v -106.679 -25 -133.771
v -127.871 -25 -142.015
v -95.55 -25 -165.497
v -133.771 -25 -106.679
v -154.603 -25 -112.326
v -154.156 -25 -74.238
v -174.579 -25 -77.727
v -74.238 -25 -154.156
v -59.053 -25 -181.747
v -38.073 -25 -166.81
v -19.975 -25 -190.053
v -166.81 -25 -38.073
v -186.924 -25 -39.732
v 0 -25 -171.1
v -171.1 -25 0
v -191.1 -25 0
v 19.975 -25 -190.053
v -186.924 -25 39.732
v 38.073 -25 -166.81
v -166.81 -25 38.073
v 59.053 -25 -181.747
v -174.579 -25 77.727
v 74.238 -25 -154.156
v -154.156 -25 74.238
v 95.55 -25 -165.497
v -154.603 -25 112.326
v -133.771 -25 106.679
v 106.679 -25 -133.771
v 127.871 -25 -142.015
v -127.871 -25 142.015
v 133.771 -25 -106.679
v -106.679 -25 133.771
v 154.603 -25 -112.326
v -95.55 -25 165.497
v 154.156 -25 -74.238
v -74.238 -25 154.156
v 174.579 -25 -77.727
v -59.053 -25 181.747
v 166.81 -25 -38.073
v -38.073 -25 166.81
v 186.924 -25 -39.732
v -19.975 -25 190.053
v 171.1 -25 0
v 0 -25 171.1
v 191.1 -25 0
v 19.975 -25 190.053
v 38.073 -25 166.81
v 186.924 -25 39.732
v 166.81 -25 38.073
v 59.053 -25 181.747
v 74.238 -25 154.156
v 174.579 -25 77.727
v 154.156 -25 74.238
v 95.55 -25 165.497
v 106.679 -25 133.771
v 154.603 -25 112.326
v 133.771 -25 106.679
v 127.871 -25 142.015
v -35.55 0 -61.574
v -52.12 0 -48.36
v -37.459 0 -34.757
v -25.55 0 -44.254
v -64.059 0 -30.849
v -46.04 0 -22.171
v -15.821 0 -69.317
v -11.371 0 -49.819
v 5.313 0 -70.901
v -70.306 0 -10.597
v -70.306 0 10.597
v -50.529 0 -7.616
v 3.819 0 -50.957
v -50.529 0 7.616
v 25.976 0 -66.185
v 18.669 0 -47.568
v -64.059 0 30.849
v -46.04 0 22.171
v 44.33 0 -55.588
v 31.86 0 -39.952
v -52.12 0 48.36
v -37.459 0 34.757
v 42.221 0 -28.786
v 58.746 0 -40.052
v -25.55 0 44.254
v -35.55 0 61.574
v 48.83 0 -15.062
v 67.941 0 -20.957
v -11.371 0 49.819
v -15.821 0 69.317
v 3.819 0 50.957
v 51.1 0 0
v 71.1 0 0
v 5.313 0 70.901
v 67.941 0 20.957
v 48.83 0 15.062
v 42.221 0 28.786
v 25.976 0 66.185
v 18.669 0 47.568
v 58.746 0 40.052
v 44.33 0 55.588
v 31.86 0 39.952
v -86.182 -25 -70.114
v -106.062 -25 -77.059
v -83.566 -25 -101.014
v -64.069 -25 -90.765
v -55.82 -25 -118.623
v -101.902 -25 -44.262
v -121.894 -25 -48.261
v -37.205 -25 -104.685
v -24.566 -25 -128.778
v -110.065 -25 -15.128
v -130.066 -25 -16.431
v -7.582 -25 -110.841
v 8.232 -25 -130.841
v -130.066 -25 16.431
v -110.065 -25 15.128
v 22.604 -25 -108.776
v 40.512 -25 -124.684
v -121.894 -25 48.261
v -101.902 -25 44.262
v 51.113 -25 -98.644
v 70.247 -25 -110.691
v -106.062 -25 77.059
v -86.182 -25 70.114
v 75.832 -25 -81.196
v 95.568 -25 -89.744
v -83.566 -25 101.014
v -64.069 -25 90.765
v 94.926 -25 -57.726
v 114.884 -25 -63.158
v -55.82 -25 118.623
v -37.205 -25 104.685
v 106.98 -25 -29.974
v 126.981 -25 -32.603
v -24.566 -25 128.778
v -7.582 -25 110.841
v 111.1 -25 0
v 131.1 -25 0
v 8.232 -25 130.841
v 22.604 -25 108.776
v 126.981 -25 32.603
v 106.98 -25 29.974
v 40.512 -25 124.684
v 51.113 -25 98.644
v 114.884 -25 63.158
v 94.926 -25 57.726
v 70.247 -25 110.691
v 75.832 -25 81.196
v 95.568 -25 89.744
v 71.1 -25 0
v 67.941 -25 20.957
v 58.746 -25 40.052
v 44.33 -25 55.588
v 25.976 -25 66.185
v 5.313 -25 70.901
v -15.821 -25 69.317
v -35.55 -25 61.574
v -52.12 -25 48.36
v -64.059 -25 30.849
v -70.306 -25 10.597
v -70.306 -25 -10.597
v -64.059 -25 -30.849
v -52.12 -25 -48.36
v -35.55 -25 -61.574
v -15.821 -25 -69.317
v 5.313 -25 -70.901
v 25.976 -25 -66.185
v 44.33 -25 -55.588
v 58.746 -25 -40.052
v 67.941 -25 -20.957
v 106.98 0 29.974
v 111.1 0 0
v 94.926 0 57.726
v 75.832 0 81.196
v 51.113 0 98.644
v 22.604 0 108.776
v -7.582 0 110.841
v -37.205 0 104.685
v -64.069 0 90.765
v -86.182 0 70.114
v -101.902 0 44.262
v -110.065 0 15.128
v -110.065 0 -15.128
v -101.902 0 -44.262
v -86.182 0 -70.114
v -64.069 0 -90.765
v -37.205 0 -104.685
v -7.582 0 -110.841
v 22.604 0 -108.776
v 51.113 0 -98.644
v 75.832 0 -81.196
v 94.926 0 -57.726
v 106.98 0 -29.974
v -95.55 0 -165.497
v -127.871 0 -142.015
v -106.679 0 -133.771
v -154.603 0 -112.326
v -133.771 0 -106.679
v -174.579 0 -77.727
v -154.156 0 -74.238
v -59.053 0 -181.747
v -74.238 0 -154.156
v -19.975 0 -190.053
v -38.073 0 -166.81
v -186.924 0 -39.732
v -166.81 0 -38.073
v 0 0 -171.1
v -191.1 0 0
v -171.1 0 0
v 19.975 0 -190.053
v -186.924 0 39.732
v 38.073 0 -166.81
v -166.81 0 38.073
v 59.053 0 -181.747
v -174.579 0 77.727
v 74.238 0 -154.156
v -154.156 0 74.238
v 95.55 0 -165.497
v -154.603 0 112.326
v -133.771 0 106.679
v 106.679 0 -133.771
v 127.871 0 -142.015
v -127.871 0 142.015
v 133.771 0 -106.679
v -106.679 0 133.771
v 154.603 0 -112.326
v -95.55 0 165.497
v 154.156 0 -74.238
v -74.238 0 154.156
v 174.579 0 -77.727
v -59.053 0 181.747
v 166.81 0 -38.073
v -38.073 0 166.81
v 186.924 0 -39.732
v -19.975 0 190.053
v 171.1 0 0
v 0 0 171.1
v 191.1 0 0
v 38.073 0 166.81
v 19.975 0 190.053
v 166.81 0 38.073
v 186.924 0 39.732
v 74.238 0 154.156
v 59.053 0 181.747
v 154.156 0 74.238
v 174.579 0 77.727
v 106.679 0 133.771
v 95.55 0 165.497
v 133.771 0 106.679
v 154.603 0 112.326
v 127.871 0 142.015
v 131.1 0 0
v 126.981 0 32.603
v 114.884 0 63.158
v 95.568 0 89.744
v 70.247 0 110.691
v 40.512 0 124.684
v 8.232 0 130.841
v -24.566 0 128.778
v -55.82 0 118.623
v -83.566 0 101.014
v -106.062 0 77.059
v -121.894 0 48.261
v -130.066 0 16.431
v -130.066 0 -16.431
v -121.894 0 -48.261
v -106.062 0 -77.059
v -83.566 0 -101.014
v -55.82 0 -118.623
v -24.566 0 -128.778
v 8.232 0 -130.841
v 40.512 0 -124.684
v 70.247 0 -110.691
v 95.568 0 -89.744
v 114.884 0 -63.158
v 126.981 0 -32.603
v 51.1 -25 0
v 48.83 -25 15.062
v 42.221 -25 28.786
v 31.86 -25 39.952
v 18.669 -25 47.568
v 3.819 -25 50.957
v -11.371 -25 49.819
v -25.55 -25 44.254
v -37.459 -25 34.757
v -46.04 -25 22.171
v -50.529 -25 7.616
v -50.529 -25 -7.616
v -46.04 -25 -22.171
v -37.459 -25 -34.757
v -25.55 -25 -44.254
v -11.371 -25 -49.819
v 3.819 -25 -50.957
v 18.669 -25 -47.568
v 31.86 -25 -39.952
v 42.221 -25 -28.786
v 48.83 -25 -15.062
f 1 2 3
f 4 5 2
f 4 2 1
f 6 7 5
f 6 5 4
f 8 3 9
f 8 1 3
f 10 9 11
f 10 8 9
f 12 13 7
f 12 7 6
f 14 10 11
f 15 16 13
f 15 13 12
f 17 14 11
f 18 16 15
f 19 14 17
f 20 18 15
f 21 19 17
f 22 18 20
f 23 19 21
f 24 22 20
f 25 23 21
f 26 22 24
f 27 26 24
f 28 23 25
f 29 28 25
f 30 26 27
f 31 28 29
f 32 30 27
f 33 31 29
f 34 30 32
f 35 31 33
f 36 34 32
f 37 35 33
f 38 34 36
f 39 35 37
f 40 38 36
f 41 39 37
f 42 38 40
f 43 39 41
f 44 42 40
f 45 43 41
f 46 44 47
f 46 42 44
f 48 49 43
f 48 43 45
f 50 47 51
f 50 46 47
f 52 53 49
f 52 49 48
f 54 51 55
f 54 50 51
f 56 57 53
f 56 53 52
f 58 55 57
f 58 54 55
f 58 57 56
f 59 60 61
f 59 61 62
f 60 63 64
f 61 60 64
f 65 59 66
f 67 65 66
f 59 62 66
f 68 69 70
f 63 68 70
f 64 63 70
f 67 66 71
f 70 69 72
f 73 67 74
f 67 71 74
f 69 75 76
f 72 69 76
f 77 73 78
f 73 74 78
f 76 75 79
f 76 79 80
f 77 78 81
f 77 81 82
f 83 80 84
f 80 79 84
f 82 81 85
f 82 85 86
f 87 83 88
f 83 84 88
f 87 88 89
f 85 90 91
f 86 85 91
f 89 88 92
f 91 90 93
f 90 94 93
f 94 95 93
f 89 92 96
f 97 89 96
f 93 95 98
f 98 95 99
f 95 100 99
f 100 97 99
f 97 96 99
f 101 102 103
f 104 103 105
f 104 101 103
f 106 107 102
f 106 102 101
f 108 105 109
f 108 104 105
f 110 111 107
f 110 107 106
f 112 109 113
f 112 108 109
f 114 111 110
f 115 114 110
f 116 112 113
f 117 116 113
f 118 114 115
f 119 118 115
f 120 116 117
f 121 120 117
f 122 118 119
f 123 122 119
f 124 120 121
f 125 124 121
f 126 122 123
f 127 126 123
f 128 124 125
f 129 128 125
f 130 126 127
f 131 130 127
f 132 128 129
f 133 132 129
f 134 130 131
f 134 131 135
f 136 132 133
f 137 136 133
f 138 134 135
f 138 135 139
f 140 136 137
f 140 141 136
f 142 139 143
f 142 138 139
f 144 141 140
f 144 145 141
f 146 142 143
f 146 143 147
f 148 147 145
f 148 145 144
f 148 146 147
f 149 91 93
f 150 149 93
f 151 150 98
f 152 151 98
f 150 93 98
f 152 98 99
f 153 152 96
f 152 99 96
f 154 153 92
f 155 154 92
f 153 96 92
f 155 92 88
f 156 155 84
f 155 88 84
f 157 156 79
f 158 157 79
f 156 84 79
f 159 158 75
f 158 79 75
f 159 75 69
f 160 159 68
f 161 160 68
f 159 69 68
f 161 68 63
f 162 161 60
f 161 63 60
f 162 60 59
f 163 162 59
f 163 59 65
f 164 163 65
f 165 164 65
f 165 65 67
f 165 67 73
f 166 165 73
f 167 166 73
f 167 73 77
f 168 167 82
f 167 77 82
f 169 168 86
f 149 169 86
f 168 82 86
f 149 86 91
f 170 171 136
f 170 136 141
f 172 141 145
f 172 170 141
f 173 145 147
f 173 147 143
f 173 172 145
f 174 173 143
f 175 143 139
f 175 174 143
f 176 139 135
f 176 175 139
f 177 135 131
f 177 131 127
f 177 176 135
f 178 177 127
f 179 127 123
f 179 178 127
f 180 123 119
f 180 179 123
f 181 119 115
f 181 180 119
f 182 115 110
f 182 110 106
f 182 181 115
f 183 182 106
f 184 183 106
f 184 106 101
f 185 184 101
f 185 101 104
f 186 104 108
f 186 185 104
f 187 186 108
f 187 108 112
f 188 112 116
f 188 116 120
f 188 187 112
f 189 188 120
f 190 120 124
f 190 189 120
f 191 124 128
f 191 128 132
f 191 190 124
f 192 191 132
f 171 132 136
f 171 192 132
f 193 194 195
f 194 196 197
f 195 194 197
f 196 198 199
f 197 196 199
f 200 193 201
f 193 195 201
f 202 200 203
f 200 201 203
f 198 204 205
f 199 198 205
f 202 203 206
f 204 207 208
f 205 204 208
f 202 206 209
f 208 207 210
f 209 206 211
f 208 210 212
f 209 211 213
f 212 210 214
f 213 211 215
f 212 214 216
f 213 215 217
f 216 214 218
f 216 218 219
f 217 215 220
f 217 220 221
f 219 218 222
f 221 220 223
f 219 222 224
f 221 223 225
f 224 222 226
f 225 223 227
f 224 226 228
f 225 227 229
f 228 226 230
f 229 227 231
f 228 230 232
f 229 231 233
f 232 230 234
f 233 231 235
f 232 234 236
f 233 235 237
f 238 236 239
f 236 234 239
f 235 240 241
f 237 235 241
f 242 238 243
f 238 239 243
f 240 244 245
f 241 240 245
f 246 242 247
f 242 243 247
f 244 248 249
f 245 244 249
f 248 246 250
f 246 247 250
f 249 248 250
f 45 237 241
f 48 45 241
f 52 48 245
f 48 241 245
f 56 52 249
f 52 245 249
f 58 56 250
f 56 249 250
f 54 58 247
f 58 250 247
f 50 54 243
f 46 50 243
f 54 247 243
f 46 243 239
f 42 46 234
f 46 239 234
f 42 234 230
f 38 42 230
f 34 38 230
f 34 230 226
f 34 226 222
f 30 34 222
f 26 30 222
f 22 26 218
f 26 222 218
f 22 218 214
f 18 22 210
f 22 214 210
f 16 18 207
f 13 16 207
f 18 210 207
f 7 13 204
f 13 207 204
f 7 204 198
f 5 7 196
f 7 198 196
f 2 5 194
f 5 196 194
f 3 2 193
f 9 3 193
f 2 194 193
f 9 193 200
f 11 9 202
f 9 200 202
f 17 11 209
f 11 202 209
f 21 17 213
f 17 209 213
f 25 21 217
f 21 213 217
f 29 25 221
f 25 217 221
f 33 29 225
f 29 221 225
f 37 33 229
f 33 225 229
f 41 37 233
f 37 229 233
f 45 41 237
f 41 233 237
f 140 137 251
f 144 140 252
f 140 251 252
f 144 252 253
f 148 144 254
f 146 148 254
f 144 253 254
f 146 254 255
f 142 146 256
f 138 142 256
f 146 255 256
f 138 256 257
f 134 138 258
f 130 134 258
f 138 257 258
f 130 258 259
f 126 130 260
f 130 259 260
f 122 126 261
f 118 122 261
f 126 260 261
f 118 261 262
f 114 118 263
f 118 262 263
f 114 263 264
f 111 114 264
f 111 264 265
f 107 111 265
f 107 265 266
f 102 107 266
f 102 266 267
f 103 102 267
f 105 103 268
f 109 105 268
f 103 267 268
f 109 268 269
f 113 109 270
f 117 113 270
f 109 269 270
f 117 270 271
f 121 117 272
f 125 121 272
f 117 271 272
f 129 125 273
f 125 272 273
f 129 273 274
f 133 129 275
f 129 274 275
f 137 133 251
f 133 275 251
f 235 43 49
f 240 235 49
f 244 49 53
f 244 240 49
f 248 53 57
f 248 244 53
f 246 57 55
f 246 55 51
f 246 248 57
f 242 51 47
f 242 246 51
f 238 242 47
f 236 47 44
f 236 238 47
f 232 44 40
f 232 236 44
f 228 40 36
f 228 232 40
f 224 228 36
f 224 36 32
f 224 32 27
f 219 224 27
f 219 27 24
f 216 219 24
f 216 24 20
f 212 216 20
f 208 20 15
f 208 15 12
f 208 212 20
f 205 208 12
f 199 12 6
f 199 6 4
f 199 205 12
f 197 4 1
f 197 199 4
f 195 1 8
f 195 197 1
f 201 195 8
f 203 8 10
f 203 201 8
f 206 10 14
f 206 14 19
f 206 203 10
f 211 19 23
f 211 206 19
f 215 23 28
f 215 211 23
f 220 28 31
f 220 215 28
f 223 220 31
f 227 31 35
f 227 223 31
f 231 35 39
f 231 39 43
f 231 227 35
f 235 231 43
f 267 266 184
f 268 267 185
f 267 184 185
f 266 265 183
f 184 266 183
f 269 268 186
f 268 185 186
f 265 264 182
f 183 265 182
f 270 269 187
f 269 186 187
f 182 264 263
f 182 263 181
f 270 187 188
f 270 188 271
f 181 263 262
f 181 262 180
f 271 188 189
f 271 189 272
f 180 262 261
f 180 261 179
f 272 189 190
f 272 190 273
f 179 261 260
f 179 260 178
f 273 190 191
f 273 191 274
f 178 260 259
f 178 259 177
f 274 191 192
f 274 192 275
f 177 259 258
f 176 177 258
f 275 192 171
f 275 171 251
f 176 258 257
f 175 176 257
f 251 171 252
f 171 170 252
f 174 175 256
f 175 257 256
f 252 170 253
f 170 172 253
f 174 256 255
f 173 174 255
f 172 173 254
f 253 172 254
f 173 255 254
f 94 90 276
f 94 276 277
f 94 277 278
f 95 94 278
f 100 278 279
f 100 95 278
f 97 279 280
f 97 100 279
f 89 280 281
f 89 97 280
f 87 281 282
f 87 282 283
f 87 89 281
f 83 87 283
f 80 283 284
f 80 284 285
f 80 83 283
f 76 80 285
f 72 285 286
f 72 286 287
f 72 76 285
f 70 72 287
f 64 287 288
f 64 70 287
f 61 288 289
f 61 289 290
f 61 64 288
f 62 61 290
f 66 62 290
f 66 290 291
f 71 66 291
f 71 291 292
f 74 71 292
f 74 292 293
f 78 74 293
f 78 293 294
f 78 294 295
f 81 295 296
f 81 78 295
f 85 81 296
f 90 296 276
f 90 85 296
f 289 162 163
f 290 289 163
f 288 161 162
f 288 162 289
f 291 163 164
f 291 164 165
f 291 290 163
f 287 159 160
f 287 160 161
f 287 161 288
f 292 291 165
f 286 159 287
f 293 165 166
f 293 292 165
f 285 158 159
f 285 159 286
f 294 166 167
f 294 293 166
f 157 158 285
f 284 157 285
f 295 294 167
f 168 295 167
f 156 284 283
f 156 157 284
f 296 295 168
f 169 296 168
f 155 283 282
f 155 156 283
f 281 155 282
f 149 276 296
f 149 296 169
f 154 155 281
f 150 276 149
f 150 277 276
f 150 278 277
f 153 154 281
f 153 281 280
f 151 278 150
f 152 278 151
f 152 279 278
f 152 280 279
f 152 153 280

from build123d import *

# Parameters (mm, degrees)
F0_R     = 191.1000013351
F0_R_2   = 171.0999992129
F1_DEPTH = 25
F0_R_3   = 71.1000000685
F0_R_4   = 51.0999997705
F0_R_5   = 131.0999962257
F0_R_6   = 111.1000000685


with BuildPart() as f1:
    # F0 (on Front) → F1 (new body)
    with BuildSketch(Plane.XZ):
        Circle(F0_R)
        Circle(F0_R_2, mode=Mode.SUBTRACT)
    extrude(amount=F1_DEPTH)


with BuildPart() as f1b:
    # F0 (on Front) → F1, piece 2 (new body)
    with BuildSketch(Plane.XZ):
        Circle(F0_R_3)
        Circle(F0_R_4, mode=Mode.SUBTRACT)
    extrude(amount=F1_DEPTH)


with BuildPart() as f1c:
    # F0 (on Front) → F1, piece 3 (new body)
    with BuildSketch(Plane.XZ):
        Circle(F0_R_5)
        Circle(F0_R_6, mode=Mode.SUBTRACT)
    extrude(amount=F1_DEPTH)


solid = Compound([f1.part, f1b.part, f1c.part])
